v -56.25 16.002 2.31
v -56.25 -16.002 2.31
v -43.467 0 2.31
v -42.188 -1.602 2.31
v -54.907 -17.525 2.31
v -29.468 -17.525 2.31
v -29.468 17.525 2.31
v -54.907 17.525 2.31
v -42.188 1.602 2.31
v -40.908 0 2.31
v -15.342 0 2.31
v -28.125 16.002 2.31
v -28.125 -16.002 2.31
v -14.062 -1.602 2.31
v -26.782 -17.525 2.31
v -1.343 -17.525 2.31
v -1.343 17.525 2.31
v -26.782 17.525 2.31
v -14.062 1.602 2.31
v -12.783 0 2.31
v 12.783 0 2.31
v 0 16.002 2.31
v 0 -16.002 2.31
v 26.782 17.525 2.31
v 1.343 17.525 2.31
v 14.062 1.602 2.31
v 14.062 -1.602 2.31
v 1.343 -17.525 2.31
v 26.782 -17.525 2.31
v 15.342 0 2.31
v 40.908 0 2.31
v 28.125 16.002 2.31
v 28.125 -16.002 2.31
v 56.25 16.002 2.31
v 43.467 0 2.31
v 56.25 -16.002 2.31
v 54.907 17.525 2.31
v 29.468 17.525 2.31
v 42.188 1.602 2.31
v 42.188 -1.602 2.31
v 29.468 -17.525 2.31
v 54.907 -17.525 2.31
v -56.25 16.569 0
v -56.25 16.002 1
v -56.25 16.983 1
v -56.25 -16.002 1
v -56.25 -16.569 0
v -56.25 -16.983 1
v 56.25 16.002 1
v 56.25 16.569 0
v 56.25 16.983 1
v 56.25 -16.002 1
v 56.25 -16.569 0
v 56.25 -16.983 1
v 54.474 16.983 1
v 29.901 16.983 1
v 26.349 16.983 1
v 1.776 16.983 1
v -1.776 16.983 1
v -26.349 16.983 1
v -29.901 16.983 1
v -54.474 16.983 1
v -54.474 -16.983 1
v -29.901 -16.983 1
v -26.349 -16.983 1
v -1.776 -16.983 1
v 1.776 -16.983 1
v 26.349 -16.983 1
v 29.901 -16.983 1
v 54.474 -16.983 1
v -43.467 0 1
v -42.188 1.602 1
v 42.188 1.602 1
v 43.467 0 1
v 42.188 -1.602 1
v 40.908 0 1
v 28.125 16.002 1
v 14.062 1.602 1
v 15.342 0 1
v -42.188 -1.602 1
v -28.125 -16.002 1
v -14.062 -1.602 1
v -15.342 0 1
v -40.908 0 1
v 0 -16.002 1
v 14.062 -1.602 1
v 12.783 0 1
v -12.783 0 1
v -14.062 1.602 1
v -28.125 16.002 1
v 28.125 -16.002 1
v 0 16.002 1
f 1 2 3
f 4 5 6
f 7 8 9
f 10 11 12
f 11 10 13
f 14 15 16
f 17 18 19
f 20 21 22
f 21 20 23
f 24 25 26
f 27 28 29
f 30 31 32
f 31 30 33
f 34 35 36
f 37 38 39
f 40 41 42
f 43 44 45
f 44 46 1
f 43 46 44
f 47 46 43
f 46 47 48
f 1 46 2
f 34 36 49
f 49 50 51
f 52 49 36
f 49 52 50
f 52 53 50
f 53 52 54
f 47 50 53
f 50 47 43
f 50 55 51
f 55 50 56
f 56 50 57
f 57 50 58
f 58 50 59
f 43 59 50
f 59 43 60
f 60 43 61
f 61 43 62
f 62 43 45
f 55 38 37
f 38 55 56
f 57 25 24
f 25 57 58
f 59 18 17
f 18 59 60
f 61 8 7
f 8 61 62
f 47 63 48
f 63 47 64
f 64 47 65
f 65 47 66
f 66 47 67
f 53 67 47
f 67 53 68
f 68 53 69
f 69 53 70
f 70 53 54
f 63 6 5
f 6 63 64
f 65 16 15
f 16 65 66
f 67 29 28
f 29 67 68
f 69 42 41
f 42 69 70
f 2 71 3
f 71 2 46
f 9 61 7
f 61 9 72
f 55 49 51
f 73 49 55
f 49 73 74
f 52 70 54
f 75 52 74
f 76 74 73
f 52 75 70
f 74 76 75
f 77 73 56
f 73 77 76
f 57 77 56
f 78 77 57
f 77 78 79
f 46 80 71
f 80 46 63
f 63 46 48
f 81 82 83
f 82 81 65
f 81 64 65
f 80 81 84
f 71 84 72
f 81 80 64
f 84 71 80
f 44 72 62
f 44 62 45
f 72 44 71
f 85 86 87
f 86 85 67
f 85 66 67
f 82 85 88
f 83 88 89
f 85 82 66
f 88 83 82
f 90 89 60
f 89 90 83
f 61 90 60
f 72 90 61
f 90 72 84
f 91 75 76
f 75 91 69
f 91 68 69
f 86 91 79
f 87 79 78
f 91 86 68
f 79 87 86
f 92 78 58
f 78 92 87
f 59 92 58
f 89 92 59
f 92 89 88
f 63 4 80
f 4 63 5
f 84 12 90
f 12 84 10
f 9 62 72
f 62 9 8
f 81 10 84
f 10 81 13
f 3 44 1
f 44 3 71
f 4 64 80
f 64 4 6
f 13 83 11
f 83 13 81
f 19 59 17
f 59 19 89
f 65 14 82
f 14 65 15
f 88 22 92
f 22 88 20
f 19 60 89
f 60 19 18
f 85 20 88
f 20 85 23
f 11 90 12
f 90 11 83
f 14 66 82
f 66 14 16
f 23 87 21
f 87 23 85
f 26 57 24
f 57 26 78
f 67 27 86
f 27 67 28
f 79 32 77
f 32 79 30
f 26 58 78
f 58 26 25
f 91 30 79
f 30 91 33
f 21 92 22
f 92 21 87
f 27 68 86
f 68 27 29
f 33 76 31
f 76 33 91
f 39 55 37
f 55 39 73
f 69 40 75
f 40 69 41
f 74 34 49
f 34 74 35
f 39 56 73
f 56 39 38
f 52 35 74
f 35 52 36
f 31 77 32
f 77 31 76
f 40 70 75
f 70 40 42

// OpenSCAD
// file: ../lib/project/cache_pot_geometry.scad
// Shared paneled cache pot geometry helpers.

function cache_pot_outside_height(inside_height, bottom_thickness) =
  inside_height + bottom_thickness;

function cache_pot_outside_radius(inside_radius, min_wall_thickness, num_panels) =
  (inside_radius + min_wall_thickness) / cos(180 / num_panels);

function cache_pot_panel_extra_radius(panel_thickness, num_panels) =
  panel_thickness / cos(180 / num_panels);

function cache_pot_panel_width(outside_radius, panel_thickness, num_panels) =
  (outside_radius + cache_pot_panel_extra_radius(panel_thickness, num_panels)) *
  2 * sin(180 / num_panels);

module cache_pot_outside_cylinder(outside_height, outside_radius, num_panels) {
  cylinder(outside_height, outside_radius, outside_radius, $fn = num_panels);
}

module cache_pot_inside_cutout(
  inside_height,
  inside_radius,
  bottom_thickness,
  bottom_edge_width
) {
  translate([0, 0, bottom_thickness])
    cylinder(inside_height + 1, inside_radius, inside_radius);
  translate([0, 0, -0.5 * bottom_thickness])
    cylinder(
      2 * bottom_thickness,
      inside_radius - bottom_edge_width,
      inside_radius - bottom_edge_width
    );
}

module cache_pot_core(
  inside_height,
  inside_radius,
  bottom_thickness,
  bottom_edge_width,
  outside_height,
  outside_radius,
  num_panels
) {
  difference() {
    cache_pot_outside_cylinder(outside_height, outside_radius, num_panels);
    cache_pot_inside_cutout(
      inside_height,
      inside_radius,
      bottom_thickness,
      bottom_edge_width
    );
  }
}

module cache_pot_panel_shell(
  outside_height,
  outside_radius,
  panel_thickness,
  num_panels
) {
  difference() {
    cylinder(
      outside_height,
      outside_radius + panel_thickness,
      outside_radius + panel_thickness,
      $fn = num_panels
    );
    translate([0, 0, -1])
      cylinder(outside_height + 2, outside_radius, outside_radius, $fn = num_panels);
    translate([-(outside_radius + panel_thickness + 1), 0, -1])
      cube([
        2 * (outside_radius + panel_thickness + 1),
        2 * (outside_radius + panel_thickness + 1),
        outside_height + 2
      ]);
    rotate([0, 0, 180 - 360 / num_panels])
      translate([-(outside_radius + panel_thickness + 1), 0, -1])
        cube([
          2 * (outside_radius + panel_thickness + 1),
          2 * (outside_radius + panel_thickness + 1),
          outside_height + 2
        ]);
  }
}

module cache_pot_panel_flat_on_bed(
  inside_radius,
  min_wall_thickness,
  outside_height,
  num_panels,
  outside_radius,
  panel_thickness
) {
  translate([outside_height / 2, 0, -(inside_radius + min_wall_thickness)])
    rotate([0, -90, 0])
      rotate([0, 0, 180 / num_panels])
        cache_pot_panel_shell(
          outside_height = outside_height,
          outside_radius = outside_radius,
          panel_thickness = panel_thickness,
          num_panels = num_panels
        );
}
// main file
// Paneled cache pot diamond panel.

use <../lib/project/cache_pot_geometry.scad>;

// ---------- Public parameters (mm) ----------
inside_radius = 75 / 2;
inside_height = 110;
min_wall_thickness = 2.5;
bottom_thickness = 2.5;
bottom_edge_width = 10;
num_panels = 8;
panel_thickness = 2.5;
groove_depth = 1.5;
groove_width = 2.0;

// ---------- Resolution ----------
$fa = 1;
$fs = 1;

// ---------- Derived ----------
outside_height = cache_pot_outside_height(inside_height, bottom_thickness);
outside_radius = cache_pot_outside_radius(inside_radius, min_wall_thickness, num_panels);
panel_width = cache_pot_panel_width(outside_radius, panel_thickness, num_panels);

module panel_groove() {
    groove_x = outside_height / 4;
    groove_y = panel_width;
    groove_angle = atan(groove_y / groove_x);
    translate([0, 0, panel_thickness * 1.5 - groove_depth]) rotate([0, 0, groove_angle]) cube([outside_height, groove_width, panel_thickness], center=true);
    translate([0, 0, panel_thickness * 1.5 - groove_depth]) rotate([0, 0, -groove_angle]) cube([outside_height, groove_width, panel_thickness], center=true);
}

module grooved_panel() {
    groove_x = outside_height / 4;
    difference() {
        cache_pot_panel_flat_on_bed(
          inside_radius = inside_radius,
          min_wall_thickness = min_wall_thickness,
          outside_height = outside_height,
          num_panels = num_panels,
          outside_radius = outside_radius,
          panel_thickness = panel_thickness
        );
        translate([-1.5 * groove_x, 0, 0]) panel_groove();
        translate([-0.5 * groove_x, 0, 0]) panel_groove();
        translate([0.5 * groove_x, 0, 0]) panel_groove();
        translate([1.5 * groove_x, 0, 0]) panel_groove();
    }
}

grooved_panel();
//color("red") panel();
//color("yellow") core();
